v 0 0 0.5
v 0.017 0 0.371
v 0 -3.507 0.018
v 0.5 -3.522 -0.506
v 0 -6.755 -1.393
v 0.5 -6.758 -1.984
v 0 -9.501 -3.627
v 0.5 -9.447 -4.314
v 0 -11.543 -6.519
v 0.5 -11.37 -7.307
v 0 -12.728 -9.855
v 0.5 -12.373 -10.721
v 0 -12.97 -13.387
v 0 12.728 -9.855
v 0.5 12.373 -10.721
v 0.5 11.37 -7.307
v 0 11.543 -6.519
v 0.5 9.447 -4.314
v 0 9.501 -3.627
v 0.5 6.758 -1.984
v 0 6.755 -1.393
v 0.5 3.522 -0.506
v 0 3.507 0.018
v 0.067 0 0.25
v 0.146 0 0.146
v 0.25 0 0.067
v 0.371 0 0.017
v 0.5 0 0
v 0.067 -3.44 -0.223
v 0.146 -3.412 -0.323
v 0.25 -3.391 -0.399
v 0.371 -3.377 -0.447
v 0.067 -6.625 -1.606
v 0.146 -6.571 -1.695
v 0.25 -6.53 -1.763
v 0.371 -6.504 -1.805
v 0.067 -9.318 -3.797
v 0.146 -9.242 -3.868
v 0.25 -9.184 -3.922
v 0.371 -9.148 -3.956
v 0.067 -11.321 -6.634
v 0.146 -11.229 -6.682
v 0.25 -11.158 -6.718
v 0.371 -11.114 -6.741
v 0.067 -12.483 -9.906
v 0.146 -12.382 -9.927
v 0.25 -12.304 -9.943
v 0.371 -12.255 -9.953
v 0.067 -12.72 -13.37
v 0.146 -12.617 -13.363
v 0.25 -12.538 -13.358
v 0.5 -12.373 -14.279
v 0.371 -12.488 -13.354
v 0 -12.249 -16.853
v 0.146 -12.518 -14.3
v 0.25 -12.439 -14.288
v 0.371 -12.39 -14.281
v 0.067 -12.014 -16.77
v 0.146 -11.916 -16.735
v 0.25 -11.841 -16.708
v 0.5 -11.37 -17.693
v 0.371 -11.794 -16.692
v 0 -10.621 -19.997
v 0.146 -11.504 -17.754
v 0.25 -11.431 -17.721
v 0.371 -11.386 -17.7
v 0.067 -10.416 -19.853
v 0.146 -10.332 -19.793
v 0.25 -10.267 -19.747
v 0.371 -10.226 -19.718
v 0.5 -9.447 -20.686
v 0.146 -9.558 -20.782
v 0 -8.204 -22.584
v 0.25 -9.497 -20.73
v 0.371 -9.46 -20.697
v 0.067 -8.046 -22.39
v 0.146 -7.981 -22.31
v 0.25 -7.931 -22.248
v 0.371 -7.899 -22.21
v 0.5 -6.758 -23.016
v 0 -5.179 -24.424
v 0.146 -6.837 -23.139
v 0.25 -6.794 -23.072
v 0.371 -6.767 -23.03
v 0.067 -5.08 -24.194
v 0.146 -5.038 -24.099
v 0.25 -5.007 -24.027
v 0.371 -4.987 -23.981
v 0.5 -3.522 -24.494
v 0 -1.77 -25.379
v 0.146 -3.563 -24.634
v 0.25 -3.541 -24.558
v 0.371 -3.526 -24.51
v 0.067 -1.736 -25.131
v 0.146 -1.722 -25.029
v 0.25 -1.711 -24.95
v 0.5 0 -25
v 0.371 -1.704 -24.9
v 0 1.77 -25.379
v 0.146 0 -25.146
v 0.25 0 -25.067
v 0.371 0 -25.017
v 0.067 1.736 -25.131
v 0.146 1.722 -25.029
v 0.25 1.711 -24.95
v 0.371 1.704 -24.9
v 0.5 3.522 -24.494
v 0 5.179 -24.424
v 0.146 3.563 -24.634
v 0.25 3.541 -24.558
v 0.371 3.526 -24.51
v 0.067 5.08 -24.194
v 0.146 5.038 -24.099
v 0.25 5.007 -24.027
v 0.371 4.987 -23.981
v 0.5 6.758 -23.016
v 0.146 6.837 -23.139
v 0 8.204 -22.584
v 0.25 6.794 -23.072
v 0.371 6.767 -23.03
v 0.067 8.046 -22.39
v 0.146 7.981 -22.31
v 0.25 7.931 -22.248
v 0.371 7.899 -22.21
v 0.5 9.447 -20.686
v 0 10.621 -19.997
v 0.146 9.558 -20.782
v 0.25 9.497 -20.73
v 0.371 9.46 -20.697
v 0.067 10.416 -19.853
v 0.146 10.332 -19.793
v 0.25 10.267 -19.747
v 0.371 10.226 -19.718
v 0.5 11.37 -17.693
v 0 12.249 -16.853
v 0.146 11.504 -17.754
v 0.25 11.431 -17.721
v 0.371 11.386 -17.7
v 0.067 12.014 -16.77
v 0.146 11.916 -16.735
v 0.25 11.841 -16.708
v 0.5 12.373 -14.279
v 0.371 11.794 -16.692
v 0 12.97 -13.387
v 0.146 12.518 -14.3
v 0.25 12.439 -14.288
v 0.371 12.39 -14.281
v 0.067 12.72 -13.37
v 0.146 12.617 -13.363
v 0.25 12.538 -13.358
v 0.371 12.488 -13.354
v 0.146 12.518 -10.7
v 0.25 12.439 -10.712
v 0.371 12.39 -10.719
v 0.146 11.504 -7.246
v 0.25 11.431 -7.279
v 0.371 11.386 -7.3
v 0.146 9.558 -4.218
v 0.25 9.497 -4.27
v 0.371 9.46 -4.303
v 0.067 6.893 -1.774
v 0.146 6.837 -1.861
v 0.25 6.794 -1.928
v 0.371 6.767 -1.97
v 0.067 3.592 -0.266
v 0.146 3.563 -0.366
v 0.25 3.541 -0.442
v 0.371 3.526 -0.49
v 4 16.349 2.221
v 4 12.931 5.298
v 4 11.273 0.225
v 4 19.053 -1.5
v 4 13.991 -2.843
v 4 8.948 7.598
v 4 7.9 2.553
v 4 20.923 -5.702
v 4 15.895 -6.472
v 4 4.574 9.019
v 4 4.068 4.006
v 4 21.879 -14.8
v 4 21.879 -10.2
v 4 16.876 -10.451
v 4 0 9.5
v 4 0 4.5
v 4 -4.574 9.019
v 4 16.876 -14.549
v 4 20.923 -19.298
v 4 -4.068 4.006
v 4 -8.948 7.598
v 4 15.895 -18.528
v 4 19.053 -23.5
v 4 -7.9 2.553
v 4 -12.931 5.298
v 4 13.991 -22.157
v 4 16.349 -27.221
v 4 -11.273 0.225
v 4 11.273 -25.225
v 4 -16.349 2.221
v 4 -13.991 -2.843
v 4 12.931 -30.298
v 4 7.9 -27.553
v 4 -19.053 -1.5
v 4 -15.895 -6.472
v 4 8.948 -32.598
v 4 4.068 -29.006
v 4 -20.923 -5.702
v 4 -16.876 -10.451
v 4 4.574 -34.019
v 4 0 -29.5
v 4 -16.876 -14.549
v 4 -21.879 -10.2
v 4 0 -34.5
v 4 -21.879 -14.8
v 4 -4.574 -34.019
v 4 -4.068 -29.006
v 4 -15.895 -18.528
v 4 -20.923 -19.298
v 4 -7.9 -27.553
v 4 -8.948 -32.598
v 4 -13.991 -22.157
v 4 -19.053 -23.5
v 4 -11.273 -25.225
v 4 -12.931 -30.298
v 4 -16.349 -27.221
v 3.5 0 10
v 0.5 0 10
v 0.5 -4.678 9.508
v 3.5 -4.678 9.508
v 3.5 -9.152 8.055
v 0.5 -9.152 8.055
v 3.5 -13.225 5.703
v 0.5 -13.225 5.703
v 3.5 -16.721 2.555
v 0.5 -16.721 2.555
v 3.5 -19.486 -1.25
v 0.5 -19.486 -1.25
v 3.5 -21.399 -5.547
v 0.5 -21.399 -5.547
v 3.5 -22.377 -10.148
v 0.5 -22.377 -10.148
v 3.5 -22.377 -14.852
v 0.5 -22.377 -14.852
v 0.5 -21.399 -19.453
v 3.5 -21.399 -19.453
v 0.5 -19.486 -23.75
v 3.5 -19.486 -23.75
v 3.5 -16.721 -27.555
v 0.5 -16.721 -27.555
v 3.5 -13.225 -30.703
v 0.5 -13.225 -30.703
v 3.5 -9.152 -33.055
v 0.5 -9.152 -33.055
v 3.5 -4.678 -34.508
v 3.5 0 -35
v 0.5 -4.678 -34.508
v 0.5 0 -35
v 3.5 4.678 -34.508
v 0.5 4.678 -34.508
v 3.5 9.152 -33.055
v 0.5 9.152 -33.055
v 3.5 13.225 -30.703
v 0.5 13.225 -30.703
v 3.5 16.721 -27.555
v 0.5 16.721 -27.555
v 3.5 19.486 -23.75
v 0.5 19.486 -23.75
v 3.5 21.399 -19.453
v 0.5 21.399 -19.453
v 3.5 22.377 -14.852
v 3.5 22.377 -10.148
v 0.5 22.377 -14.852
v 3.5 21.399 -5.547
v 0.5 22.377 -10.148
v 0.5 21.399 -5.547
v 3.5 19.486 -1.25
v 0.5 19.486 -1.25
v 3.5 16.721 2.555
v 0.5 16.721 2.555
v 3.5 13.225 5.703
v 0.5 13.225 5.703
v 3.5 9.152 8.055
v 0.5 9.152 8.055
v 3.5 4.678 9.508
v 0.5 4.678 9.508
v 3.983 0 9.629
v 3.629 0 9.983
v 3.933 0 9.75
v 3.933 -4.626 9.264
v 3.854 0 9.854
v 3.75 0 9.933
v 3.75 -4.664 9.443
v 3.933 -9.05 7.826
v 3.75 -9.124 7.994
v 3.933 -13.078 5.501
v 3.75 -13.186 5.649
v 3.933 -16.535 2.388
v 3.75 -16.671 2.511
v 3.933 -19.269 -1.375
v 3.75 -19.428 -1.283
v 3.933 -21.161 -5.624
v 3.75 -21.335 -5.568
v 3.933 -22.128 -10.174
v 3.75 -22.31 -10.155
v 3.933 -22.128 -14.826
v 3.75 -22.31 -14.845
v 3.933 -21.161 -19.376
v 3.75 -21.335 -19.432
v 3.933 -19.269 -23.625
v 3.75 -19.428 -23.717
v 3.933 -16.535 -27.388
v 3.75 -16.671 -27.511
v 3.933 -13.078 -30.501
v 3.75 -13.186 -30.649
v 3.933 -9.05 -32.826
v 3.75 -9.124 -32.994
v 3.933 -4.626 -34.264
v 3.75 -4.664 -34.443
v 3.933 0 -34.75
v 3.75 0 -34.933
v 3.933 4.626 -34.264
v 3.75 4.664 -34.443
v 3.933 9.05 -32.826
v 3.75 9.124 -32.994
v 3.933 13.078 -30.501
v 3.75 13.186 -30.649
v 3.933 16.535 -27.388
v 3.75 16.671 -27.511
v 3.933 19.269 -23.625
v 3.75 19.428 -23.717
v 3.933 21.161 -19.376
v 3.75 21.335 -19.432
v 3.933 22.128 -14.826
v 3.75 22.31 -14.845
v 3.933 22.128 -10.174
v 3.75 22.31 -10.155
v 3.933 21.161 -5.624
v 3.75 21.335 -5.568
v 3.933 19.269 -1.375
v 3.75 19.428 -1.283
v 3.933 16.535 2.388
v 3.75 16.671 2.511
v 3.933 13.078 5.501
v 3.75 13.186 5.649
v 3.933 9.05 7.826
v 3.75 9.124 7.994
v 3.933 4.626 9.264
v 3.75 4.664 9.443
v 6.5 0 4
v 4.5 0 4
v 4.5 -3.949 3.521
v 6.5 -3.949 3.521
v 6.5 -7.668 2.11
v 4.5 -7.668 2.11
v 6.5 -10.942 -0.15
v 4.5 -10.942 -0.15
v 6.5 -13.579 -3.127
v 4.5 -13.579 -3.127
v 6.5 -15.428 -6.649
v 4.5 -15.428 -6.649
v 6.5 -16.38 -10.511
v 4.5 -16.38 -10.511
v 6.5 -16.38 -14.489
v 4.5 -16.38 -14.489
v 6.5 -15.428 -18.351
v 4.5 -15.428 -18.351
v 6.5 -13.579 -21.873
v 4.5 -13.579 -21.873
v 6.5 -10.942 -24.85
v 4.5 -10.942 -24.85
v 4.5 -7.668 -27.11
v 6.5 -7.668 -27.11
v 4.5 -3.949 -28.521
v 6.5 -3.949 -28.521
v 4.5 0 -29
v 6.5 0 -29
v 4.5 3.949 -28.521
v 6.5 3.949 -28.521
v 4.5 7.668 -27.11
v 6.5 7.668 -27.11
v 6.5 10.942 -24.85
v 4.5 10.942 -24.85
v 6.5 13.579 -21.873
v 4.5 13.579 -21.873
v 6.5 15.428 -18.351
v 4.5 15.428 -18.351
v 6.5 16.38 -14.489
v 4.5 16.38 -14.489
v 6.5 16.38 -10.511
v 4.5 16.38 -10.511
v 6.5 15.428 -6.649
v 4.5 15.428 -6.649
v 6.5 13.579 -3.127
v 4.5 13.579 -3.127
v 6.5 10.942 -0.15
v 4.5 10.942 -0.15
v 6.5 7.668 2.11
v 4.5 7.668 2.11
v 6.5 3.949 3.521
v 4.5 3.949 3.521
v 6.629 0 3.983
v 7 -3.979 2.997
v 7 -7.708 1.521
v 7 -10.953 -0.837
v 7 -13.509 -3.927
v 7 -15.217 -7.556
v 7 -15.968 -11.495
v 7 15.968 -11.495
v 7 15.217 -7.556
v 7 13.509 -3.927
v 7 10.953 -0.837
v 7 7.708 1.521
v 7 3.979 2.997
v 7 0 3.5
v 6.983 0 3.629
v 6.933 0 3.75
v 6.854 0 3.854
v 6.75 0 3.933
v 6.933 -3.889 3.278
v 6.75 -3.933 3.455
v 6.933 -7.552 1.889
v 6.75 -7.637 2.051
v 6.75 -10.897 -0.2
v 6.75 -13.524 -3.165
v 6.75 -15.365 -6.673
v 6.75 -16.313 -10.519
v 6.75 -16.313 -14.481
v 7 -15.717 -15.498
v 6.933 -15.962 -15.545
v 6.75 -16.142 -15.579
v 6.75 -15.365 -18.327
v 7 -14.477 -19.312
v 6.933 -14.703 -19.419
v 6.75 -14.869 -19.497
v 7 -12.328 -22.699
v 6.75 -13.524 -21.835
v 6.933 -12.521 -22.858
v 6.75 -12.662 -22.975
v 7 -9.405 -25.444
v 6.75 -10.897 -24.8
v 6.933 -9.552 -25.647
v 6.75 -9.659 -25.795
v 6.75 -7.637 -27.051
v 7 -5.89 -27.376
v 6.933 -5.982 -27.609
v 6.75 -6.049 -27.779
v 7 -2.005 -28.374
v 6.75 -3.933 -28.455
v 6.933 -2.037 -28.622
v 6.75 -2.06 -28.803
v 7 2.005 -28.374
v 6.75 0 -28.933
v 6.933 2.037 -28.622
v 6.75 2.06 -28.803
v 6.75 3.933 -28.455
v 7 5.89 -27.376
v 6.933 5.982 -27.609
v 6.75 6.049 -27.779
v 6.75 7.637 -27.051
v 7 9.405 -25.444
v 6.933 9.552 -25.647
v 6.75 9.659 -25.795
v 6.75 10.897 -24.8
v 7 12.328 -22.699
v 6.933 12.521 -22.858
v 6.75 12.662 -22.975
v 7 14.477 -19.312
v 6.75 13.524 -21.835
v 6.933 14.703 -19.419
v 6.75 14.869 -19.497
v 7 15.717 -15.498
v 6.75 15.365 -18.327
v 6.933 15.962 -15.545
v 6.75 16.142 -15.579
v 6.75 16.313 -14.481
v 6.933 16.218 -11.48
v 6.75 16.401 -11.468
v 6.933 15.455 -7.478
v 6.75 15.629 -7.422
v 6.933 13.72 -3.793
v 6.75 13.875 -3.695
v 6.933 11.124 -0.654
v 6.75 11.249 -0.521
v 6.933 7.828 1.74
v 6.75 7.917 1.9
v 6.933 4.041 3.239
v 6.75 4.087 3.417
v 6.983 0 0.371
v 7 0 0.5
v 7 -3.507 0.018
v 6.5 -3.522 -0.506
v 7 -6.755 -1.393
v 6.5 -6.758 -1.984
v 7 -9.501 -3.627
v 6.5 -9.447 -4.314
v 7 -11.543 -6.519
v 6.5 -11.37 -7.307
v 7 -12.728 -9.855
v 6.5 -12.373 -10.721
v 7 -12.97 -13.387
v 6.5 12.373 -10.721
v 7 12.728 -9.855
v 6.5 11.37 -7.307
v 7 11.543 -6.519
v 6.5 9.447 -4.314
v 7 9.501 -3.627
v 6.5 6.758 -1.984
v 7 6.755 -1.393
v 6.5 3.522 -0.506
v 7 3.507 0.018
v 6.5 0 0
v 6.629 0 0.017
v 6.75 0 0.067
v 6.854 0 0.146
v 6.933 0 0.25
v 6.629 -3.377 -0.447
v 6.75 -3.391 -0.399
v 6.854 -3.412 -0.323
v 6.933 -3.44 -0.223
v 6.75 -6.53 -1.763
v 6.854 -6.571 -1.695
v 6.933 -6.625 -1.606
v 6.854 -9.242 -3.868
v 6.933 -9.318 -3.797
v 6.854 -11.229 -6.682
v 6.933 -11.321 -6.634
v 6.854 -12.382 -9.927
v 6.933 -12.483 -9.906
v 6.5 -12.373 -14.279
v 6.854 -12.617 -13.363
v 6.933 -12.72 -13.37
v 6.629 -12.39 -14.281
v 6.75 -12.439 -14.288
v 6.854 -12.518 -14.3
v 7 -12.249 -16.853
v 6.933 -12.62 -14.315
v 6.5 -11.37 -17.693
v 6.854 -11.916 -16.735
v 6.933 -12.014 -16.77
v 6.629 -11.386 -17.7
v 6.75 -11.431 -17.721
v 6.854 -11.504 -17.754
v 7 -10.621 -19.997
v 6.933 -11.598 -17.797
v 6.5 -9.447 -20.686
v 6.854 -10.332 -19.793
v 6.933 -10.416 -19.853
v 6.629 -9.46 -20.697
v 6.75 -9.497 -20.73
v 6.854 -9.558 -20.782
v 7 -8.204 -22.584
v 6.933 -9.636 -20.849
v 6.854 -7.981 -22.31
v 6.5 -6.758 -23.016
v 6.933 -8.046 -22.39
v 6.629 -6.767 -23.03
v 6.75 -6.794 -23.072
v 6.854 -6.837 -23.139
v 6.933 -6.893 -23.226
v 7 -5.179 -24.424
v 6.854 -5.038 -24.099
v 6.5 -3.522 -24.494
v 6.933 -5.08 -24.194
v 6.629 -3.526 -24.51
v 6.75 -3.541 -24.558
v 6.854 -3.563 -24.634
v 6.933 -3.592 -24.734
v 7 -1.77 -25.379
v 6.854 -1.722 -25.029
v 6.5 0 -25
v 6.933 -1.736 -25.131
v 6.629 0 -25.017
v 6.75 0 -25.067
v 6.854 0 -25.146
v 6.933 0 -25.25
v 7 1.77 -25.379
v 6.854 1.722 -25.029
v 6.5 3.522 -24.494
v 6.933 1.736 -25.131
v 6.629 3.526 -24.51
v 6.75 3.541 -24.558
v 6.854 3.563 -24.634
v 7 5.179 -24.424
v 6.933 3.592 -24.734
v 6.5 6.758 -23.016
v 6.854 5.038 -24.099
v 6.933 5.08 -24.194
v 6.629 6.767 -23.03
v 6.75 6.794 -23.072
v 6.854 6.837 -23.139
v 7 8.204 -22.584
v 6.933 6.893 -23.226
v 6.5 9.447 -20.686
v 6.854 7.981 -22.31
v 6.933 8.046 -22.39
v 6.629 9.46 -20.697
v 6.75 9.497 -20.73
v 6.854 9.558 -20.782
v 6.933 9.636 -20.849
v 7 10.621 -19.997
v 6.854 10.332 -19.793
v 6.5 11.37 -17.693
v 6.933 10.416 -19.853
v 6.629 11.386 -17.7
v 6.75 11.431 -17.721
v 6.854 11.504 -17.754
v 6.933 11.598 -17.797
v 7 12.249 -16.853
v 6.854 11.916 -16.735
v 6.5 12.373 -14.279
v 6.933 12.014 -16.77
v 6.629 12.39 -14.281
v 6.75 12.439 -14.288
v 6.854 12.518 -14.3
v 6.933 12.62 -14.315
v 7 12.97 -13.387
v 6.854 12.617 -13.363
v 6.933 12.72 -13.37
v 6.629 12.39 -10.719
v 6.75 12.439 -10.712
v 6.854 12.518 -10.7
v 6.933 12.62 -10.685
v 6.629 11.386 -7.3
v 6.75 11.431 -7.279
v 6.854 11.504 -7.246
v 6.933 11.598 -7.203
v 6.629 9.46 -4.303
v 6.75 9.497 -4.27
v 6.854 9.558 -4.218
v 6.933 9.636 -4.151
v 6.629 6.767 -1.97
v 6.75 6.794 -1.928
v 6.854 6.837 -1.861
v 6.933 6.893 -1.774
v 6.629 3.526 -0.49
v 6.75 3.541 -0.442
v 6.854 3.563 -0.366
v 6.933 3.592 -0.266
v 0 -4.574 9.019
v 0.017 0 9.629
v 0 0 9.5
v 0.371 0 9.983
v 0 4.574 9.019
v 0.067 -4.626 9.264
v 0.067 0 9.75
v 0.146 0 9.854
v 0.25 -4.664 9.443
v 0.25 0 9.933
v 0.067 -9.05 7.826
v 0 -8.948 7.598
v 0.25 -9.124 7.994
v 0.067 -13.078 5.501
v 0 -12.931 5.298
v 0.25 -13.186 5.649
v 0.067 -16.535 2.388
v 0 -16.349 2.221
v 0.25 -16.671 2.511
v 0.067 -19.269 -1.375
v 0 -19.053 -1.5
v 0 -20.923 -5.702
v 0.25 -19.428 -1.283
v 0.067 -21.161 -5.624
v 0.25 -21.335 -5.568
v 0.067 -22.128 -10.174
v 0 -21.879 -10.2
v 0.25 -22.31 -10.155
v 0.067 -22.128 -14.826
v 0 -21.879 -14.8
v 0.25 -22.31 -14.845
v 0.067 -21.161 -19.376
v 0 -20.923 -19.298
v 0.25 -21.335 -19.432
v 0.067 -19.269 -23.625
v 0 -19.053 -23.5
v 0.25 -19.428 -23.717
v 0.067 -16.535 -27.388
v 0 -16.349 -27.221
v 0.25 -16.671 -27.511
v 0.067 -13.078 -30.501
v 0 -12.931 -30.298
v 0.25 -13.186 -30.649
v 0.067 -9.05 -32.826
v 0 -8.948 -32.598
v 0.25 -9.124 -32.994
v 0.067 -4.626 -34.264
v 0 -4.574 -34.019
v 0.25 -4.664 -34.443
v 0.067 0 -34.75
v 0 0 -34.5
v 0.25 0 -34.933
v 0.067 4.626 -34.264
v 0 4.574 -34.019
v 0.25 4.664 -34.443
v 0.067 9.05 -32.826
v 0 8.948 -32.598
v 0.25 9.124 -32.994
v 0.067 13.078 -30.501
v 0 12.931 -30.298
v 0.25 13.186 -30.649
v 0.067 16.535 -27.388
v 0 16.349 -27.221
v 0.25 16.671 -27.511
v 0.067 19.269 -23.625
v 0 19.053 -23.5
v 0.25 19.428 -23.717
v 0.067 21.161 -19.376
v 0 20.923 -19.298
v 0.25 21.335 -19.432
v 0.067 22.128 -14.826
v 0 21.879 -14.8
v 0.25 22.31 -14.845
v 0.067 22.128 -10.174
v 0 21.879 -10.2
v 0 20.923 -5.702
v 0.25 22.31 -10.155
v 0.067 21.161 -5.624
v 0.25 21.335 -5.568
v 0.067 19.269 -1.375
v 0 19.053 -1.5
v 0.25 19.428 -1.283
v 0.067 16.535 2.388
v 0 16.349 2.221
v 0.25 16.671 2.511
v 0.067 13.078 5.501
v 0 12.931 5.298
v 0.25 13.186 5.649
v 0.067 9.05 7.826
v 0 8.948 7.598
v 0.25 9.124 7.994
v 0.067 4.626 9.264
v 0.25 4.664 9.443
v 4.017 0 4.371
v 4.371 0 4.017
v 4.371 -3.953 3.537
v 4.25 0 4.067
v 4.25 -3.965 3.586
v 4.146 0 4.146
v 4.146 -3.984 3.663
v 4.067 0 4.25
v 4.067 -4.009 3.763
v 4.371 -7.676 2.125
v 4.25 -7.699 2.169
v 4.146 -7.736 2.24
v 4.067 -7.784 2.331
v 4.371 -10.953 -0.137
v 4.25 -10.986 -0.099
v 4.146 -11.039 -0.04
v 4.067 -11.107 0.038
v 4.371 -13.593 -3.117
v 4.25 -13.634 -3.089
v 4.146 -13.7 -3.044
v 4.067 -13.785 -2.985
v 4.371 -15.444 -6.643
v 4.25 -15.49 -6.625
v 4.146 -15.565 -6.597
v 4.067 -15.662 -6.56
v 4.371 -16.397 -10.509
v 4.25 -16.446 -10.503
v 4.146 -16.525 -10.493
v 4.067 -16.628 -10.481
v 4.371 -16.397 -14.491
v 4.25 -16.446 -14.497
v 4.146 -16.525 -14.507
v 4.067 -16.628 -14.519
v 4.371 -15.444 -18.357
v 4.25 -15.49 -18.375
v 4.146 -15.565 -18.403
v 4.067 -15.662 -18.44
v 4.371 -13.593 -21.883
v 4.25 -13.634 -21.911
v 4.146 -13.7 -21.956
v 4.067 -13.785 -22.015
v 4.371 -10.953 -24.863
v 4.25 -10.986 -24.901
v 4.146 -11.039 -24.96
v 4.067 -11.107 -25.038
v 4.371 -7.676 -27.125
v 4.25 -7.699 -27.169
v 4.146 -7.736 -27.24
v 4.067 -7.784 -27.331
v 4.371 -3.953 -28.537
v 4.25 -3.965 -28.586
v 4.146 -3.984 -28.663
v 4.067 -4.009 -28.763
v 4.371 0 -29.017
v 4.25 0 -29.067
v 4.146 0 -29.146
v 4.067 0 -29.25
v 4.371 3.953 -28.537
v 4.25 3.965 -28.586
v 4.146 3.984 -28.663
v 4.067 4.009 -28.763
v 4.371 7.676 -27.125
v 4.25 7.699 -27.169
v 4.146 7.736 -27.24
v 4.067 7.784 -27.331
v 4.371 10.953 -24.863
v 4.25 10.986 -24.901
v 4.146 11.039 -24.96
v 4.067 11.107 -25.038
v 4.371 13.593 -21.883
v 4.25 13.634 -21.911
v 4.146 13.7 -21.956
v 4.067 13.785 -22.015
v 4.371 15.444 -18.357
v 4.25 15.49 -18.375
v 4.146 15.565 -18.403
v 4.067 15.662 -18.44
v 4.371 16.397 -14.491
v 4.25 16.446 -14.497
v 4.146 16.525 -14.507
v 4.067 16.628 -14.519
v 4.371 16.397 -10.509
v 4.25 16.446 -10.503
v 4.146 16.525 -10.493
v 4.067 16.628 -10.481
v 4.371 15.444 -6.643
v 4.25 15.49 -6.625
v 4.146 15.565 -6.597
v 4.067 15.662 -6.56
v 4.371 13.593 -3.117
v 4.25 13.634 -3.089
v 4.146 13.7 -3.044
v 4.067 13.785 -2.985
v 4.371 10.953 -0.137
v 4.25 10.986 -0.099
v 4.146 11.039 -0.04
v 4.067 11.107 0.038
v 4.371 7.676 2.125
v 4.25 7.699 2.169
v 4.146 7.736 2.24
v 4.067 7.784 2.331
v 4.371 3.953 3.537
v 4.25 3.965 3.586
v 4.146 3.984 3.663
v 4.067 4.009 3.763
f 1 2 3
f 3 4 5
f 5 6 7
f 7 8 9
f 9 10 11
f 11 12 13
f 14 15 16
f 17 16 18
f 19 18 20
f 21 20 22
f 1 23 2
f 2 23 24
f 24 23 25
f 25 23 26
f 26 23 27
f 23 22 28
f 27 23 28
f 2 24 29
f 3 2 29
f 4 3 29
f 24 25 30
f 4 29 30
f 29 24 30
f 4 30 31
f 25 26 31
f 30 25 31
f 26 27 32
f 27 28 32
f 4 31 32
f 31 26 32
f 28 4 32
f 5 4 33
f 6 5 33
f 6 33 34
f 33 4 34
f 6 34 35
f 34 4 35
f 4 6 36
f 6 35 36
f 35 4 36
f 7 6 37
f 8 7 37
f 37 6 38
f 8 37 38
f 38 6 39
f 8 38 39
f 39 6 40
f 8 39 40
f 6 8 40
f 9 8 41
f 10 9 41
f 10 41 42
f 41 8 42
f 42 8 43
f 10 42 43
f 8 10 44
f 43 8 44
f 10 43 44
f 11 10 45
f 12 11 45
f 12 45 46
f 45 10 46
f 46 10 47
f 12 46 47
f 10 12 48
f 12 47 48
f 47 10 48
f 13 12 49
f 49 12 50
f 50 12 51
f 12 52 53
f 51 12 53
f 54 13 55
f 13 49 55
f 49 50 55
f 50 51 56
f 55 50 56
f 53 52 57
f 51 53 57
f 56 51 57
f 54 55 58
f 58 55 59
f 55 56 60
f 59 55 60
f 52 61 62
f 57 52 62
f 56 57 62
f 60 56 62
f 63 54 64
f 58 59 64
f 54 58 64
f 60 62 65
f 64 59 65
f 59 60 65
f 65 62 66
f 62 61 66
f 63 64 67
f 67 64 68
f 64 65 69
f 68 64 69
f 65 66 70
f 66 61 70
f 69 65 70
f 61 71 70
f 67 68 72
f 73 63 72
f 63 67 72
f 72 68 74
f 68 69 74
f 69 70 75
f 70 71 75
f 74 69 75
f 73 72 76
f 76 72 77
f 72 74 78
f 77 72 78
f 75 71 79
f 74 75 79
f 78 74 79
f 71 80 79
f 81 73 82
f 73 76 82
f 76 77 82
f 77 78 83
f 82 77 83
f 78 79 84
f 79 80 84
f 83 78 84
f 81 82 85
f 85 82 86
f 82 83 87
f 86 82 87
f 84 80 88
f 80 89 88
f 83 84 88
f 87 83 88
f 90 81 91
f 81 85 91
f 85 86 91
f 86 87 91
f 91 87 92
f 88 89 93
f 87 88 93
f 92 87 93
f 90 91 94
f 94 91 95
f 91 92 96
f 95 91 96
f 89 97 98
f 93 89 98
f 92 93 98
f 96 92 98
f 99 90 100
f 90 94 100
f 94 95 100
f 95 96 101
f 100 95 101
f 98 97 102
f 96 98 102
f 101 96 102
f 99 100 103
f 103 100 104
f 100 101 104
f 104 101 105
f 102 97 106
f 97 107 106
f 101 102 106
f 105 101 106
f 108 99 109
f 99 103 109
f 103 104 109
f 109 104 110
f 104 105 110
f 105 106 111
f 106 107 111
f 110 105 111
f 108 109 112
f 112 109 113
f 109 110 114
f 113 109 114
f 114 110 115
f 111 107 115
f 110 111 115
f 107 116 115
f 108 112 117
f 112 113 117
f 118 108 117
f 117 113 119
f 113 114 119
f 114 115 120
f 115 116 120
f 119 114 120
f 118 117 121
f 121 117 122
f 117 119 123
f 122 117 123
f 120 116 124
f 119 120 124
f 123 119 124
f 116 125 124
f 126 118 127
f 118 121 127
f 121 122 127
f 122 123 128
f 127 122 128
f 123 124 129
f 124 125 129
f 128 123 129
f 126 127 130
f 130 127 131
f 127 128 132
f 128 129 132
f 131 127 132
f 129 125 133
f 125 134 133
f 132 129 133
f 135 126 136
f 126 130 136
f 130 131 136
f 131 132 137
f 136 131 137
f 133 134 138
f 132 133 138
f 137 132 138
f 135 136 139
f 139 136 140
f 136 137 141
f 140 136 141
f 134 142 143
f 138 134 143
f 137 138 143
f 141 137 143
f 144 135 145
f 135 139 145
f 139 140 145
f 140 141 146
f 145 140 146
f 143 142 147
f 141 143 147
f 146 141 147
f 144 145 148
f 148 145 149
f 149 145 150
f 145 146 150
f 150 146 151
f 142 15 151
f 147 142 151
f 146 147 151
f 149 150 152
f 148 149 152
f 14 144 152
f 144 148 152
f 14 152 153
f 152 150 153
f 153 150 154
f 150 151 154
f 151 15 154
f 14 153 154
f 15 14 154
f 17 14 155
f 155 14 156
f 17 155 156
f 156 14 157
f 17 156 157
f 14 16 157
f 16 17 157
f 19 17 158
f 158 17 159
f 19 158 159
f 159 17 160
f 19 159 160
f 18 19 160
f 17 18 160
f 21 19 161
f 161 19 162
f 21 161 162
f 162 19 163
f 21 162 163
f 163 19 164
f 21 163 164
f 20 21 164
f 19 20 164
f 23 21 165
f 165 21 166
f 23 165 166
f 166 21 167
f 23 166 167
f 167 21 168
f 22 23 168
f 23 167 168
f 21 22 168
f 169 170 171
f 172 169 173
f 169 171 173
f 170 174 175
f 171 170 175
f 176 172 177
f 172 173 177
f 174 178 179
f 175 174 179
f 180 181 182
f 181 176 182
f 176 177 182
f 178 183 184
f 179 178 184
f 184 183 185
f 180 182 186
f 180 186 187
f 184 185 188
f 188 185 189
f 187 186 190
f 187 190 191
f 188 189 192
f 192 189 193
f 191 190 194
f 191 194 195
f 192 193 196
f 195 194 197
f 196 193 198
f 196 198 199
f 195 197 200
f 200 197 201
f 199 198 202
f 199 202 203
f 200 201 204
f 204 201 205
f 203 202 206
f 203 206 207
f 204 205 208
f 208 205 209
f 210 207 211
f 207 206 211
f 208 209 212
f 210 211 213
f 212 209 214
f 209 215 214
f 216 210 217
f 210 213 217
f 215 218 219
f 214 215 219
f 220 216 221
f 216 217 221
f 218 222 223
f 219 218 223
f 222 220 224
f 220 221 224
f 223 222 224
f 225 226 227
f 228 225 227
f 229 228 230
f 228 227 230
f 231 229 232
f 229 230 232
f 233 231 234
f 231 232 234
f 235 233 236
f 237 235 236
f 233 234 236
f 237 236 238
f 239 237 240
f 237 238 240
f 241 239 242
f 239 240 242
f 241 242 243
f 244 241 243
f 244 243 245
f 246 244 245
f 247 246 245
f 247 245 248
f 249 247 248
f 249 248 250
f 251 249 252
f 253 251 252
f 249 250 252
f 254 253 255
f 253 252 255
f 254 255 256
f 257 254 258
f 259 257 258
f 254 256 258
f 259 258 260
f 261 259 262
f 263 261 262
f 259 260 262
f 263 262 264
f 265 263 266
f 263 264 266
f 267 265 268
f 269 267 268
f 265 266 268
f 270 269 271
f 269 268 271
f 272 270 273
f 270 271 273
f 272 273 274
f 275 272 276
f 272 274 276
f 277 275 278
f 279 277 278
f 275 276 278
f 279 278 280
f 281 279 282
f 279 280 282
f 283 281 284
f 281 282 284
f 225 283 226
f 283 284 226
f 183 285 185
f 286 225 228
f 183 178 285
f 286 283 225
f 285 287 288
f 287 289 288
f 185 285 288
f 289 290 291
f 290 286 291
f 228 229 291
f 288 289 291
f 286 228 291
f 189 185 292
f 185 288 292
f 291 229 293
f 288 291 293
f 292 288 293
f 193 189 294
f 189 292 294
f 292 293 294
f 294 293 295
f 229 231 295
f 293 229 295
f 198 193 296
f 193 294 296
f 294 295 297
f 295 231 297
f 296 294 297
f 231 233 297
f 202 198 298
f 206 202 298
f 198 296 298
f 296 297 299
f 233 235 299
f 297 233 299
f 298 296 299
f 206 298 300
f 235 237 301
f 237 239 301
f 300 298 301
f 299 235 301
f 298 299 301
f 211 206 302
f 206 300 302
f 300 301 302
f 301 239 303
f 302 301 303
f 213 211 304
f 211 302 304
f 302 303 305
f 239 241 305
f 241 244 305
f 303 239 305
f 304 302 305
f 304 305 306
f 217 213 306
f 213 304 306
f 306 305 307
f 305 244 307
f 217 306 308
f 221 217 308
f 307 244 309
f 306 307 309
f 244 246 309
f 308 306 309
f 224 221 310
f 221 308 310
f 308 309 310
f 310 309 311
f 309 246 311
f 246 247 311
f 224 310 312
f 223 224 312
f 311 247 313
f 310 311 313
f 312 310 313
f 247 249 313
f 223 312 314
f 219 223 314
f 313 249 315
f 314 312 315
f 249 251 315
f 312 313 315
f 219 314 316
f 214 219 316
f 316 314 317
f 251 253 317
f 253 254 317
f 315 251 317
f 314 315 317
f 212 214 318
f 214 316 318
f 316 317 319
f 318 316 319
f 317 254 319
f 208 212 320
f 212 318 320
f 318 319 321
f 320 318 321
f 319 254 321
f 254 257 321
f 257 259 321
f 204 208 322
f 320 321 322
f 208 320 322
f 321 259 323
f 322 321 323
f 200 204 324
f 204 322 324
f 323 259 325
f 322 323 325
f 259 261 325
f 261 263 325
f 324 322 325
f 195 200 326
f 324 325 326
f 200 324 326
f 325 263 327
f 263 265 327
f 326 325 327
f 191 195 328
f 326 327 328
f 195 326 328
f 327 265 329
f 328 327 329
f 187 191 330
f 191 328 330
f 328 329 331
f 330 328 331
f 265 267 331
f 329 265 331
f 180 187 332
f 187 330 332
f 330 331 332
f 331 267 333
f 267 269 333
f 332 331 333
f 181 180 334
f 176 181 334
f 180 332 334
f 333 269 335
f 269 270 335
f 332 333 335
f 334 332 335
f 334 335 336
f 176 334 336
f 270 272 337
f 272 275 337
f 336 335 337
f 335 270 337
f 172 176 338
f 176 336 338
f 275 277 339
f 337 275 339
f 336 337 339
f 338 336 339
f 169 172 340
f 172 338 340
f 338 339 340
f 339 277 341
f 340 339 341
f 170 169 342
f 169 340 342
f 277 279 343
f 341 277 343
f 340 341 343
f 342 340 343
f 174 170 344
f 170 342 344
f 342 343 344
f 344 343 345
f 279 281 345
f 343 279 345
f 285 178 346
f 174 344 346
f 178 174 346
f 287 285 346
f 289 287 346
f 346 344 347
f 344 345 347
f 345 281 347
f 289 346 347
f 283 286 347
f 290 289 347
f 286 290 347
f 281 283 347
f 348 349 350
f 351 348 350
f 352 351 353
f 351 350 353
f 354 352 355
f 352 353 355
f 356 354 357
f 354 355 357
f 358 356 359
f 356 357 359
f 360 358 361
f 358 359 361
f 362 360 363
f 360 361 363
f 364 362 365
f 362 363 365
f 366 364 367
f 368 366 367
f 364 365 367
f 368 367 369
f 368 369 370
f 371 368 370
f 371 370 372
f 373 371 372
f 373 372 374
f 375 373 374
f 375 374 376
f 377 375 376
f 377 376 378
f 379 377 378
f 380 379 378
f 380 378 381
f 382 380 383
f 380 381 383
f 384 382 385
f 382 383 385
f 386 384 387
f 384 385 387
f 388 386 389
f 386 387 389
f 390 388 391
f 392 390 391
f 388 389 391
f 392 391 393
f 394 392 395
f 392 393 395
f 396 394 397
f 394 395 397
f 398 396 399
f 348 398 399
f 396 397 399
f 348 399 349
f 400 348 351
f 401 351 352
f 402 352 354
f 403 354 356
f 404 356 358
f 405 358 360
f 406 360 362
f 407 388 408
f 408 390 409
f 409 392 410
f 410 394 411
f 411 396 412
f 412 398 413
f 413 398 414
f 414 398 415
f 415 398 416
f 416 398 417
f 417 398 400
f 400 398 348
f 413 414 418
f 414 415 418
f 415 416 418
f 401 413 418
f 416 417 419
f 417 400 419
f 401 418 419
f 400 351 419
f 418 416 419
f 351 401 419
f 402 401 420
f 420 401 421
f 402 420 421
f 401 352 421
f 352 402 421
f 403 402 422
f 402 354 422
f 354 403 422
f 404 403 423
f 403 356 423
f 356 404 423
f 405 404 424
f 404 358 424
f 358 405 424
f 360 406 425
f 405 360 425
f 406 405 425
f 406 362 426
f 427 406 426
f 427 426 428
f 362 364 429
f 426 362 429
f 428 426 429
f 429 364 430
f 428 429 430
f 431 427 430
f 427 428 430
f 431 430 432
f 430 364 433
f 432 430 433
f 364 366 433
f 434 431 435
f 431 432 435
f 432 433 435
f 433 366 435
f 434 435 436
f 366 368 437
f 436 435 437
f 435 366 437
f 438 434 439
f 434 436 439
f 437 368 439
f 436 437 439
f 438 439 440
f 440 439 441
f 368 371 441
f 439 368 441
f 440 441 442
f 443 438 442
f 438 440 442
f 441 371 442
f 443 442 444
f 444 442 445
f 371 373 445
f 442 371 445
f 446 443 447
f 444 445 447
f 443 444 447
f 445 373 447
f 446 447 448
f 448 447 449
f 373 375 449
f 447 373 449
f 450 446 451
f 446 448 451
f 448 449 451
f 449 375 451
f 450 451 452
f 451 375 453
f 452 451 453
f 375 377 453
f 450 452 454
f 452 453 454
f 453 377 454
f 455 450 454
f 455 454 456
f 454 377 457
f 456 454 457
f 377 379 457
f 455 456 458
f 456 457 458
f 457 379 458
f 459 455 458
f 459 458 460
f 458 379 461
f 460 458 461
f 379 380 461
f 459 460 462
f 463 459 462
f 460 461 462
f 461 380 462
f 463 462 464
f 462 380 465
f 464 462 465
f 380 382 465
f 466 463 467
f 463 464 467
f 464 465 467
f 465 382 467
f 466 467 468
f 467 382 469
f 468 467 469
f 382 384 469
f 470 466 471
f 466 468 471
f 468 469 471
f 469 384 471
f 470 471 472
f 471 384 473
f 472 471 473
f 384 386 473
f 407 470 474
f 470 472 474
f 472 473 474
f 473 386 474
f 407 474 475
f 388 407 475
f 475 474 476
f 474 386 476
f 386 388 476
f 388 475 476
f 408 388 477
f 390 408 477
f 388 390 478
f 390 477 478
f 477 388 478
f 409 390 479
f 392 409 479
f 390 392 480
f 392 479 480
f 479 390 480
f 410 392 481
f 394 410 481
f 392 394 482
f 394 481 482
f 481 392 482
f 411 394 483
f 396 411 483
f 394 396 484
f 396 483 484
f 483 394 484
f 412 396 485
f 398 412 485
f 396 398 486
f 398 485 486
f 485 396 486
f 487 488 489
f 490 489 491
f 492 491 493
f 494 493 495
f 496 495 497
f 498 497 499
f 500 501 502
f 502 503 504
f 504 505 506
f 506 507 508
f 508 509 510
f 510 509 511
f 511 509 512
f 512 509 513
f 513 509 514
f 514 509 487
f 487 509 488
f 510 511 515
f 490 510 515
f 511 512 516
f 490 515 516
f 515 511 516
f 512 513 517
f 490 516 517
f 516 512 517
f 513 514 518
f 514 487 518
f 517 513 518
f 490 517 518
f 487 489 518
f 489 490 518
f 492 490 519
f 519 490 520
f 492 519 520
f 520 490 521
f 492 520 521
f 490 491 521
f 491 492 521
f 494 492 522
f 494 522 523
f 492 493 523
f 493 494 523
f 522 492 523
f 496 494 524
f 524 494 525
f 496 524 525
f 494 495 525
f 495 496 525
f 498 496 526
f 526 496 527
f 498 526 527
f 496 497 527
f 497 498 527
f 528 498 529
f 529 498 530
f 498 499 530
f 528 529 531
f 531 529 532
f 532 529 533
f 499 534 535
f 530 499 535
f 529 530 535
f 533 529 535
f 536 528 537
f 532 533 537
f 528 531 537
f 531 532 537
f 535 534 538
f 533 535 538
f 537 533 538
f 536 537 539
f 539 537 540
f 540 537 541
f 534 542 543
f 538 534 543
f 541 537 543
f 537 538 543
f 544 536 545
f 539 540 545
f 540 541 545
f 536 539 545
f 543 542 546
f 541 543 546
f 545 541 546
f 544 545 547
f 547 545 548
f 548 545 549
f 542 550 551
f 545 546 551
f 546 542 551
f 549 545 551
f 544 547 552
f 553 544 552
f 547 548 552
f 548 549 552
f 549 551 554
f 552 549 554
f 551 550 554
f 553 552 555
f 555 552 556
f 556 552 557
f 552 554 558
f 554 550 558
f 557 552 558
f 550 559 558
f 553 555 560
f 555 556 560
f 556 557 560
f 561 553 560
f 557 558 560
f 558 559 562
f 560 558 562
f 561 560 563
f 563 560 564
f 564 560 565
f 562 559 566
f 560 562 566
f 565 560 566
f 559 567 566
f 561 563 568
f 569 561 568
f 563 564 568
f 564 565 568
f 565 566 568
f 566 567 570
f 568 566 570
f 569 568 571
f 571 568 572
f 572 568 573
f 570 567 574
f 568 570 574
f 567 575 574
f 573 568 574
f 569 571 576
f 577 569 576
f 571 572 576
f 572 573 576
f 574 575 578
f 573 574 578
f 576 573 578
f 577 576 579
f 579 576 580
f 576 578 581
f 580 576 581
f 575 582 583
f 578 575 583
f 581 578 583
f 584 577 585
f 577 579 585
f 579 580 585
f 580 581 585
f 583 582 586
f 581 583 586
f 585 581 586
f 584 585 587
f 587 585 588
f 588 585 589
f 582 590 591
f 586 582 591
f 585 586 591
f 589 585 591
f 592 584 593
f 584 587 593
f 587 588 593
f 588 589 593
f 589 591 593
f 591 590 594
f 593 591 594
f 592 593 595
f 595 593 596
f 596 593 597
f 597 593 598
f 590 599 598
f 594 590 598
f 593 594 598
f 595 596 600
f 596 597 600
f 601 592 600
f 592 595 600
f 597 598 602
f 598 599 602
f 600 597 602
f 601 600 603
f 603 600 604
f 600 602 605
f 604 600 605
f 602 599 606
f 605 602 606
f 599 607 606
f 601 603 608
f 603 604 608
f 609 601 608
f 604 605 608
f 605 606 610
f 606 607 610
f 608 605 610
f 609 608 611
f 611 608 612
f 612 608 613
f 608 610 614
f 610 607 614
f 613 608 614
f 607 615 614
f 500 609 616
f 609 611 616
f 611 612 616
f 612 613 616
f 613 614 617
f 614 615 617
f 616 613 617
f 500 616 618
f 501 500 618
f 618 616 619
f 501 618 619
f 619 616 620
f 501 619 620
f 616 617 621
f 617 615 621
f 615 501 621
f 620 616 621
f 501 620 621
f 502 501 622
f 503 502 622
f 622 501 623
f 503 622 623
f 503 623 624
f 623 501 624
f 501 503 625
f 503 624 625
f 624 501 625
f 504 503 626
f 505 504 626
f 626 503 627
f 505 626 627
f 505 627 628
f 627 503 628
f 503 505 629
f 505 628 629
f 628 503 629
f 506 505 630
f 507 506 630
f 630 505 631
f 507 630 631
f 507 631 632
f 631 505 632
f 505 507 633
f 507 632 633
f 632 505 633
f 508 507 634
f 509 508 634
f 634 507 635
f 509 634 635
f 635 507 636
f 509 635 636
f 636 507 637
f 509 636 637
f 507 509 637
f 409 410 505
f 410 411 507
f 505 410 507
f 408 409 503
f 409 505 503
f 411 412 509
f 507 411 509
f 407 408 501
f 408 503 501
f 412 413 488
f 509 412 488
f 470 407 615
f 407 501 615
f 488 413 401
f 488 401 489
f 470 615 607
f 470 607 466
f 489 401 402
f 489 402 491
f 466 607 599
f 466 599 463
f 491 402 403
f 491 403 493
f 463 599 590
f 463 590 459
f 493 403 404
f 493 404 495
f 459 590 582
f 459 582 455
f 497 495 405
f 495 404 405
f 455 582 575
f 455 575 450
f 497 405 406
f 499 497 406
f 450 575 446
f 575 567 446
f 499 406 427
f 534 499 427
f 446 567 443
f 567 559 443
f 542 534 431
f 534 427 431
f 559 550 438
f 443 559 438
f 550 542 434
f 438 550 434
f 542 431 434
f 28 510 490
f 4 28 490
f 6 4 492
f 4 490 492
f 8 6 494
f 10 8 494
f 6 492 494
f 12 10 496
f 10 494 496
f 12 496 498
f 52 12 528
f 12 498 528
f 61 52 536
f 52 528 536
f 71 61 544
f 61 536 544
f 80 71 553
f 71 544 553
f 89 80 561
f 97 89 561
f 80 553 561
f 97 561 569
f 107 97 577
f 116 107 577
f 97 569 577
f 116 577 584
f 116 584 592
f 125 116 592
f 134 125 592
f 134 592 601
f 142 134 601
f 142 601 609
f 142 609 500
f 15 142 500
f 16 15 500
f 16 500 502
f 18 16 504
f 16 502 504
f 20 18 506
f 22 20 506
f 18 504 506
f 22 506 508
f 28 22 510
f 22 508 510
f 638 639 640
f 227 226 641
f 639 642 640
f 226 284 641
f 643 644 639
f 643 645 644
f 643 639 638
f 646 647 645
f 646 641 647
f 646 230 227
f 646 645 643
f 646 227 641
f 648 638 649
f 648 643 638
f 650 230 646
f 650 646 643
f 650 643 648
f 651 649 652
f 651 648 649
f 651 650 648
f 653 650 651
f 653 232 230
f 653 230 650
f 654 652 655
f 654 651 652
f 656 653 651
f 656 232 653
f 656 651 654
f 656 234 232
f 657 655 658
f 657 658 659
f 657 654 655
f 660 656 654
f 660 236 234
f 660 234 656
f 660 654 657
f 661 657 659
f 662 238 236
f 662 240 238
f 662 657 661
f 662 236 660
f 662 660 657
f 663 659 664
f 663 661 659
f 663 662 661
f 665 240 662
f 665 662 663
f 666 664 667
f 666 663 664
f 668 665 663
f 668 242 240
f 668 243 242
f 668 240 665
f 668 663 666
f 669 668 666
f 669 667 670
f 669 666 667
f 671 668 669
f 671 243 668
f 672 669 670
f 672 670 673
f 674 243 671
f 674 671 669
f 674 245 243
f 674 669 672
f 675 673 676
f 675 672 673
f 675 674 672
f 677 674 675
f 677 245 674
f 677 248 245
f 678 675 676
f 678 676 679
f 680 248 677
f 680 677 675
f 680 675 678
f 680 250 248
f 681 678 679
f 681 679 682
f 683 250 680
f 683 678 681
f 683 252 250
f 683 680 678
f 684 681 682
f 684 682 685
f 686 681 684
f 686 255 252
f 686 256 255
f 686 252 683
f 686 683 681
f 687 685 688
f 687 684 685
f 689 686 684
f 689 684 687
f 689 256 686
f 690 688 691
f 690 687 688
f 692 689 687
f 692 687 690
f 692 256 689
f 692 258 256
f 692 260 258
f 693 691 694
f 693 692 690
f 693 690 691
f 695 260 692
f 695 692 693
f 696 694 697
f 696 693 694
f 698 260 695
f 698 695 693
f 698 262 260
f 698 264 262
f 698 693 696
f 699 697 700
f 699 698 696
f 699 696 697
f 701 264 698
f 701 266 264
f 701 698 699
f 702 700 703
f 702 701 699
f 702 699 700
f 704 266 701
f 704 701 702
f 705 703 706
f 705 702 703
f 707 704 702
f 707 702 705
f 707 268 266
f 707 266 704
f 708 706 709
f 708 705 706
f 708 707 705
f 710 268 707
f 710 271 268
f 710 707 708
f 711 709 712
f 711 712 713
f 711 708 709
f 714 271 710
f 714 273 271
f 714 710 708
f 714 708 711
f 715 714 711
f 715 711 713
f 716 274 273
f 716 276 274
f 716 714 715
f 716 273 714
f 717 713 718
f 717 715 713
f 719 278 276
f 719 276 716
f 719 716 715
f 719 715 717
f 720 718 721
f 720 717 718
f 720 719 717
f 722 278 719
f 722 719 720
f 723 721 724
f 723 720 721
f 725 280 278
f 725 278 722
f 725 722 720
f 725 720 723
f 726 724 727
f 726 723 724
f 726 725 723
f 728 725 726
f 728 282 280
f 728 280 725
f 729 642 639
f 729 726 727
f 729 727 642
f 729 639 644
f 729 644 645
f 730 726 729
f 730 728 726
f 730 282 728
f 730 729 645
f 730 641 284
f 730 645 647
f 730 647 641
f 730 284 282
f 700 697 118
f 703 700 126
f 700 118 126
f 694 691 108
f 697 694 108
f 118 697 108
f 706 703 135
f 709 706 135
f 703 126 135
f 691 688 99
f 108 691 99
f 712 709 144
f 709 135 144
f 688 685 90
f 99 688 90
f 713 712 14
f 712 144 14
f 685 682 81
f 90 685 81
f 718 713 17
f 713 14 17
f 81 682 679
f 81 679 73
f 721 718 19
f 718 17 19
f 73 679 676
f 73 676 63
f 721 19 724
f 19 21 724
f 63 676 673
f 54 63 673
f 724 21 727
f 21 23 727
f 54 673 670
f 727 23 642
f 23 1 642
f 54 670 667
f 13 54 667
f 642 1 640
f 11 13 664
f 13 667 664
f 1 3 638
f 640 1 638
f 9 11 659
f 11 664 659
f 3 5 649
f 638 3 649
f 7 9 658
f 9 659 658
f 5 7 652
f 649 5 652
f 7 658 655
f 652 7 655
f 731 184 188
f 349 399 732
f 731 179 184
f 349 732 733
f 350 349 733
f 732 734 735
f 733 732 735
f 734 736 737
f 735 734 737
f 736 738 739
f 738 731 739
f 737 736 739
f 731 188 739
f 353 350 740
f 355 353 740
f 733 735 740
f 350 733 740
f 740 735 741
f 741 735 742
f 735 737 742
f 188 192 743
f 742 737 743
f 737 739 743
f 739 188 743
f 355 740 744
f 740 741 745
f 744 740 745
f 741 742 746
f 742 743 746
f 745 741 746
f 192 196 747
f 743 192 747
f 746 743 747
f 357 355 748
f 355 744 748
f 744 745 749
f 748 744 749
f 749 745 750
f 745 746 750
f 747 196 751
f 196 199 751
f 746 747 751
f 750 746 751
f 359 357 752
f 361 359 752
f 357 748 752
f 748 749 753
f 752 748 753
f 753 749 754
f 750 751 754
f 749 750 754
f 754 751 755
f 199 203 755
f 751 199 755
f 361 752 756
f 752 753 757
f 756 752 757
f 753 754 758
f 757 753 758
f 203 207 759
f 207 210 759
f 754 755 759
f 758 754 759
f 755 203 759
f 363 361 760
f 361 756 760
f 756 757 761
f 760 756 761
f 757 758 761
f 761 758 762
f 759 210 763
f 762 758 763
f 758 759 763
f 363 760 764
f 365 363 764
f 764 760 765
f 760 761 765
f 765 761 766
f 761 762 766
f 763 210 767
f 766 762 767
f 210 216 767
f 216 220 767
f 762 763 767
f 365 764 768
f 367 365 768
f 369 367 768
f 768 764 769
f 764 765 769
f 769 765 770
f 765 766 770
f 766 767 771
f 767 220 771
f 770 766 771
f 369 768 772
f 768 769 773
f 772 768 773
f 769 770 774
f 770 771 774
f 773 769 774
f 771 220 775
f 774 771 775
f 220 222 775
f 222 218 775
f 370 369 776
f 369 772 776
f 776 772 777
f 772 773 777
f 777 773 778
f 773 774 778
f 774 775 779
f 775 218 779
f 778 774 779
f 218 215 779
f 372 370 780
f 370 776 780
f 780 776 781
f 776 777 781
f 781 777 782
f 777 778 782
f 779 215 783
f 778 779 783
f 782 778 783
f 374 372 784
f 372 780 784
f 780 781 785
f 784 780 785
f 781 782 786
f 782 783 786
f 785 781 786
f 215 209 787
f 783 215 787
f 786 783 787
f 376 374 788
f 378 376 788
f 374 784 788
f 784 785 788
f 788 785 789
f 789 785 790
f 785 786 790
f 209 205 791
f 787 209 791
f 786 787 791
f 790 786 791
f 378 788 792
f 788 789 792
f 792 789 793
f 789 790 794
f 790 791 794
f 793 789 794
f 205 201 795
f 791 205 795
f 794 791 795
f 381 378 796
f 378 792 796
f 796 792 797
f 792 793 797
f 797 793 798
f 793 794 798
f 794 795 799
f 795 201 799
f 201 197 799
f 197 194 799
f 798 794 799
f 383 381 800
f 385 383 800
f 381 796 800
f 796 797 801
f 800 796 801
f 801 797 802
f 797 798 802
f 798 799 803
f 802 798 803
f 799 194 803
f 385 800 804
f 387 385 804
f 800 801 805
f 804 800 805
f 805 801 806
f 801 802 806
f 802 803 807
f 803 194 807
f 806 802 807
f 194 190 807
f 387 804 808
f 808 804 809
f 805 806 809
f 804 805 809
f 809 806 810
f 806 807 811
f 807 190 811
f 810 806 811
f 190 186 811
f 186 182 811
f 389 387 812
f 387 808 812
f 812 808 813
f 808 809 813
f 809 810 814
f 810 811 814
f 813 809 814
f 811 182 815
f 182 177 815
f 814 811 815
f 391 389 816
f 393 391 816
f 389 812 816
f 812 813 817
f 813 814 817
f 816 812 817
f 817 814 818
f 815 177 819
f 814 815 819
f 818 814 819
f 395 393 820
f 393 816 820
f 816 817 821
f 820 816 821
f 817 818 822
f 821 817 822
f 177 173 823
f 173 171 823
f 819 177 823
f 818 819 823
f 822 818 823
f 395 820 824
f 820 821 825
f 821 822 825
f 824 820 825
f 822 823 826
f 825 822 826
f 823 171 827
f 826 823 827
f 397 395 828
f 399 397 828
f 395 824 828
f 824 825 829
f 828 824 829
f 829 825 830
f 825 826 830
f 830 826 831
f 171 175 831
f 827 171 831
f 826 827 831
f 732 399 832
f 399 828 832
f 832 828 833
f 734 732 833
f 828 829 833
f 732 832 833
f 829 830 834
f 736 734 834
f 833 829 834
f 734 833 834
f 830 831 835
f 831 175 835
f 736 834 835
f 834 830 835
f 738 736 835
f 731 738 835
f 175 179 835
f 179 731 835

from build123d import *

# Parameters (mm, degrees)
F2_R = 0.5


with BuildPart() as f1:
    # F0 (on Front) → F1 (revolve)
    with BuildSketch(Plane.XZ):
        Polygon((0, 10), (0, 0), (7, 0), (7, 4), (4, 4), (4, 10), align=None)
    revolve(axis=Axis((3.1215194613, 0, -12.5), (1, 0, 0)))

    # F2
    f2_edges = [f1.edges().sort_by_distance(p)[0] for p in [
        (7, 0, -29),
        (7, 0, -25),
        (4, 0, -35),
        (0, 0, -35),
        (0, 0, -25),
        (4, 0, -29),
    ]]
    fillet(f2_edges, radius=F2_R)


solid = f1.part
